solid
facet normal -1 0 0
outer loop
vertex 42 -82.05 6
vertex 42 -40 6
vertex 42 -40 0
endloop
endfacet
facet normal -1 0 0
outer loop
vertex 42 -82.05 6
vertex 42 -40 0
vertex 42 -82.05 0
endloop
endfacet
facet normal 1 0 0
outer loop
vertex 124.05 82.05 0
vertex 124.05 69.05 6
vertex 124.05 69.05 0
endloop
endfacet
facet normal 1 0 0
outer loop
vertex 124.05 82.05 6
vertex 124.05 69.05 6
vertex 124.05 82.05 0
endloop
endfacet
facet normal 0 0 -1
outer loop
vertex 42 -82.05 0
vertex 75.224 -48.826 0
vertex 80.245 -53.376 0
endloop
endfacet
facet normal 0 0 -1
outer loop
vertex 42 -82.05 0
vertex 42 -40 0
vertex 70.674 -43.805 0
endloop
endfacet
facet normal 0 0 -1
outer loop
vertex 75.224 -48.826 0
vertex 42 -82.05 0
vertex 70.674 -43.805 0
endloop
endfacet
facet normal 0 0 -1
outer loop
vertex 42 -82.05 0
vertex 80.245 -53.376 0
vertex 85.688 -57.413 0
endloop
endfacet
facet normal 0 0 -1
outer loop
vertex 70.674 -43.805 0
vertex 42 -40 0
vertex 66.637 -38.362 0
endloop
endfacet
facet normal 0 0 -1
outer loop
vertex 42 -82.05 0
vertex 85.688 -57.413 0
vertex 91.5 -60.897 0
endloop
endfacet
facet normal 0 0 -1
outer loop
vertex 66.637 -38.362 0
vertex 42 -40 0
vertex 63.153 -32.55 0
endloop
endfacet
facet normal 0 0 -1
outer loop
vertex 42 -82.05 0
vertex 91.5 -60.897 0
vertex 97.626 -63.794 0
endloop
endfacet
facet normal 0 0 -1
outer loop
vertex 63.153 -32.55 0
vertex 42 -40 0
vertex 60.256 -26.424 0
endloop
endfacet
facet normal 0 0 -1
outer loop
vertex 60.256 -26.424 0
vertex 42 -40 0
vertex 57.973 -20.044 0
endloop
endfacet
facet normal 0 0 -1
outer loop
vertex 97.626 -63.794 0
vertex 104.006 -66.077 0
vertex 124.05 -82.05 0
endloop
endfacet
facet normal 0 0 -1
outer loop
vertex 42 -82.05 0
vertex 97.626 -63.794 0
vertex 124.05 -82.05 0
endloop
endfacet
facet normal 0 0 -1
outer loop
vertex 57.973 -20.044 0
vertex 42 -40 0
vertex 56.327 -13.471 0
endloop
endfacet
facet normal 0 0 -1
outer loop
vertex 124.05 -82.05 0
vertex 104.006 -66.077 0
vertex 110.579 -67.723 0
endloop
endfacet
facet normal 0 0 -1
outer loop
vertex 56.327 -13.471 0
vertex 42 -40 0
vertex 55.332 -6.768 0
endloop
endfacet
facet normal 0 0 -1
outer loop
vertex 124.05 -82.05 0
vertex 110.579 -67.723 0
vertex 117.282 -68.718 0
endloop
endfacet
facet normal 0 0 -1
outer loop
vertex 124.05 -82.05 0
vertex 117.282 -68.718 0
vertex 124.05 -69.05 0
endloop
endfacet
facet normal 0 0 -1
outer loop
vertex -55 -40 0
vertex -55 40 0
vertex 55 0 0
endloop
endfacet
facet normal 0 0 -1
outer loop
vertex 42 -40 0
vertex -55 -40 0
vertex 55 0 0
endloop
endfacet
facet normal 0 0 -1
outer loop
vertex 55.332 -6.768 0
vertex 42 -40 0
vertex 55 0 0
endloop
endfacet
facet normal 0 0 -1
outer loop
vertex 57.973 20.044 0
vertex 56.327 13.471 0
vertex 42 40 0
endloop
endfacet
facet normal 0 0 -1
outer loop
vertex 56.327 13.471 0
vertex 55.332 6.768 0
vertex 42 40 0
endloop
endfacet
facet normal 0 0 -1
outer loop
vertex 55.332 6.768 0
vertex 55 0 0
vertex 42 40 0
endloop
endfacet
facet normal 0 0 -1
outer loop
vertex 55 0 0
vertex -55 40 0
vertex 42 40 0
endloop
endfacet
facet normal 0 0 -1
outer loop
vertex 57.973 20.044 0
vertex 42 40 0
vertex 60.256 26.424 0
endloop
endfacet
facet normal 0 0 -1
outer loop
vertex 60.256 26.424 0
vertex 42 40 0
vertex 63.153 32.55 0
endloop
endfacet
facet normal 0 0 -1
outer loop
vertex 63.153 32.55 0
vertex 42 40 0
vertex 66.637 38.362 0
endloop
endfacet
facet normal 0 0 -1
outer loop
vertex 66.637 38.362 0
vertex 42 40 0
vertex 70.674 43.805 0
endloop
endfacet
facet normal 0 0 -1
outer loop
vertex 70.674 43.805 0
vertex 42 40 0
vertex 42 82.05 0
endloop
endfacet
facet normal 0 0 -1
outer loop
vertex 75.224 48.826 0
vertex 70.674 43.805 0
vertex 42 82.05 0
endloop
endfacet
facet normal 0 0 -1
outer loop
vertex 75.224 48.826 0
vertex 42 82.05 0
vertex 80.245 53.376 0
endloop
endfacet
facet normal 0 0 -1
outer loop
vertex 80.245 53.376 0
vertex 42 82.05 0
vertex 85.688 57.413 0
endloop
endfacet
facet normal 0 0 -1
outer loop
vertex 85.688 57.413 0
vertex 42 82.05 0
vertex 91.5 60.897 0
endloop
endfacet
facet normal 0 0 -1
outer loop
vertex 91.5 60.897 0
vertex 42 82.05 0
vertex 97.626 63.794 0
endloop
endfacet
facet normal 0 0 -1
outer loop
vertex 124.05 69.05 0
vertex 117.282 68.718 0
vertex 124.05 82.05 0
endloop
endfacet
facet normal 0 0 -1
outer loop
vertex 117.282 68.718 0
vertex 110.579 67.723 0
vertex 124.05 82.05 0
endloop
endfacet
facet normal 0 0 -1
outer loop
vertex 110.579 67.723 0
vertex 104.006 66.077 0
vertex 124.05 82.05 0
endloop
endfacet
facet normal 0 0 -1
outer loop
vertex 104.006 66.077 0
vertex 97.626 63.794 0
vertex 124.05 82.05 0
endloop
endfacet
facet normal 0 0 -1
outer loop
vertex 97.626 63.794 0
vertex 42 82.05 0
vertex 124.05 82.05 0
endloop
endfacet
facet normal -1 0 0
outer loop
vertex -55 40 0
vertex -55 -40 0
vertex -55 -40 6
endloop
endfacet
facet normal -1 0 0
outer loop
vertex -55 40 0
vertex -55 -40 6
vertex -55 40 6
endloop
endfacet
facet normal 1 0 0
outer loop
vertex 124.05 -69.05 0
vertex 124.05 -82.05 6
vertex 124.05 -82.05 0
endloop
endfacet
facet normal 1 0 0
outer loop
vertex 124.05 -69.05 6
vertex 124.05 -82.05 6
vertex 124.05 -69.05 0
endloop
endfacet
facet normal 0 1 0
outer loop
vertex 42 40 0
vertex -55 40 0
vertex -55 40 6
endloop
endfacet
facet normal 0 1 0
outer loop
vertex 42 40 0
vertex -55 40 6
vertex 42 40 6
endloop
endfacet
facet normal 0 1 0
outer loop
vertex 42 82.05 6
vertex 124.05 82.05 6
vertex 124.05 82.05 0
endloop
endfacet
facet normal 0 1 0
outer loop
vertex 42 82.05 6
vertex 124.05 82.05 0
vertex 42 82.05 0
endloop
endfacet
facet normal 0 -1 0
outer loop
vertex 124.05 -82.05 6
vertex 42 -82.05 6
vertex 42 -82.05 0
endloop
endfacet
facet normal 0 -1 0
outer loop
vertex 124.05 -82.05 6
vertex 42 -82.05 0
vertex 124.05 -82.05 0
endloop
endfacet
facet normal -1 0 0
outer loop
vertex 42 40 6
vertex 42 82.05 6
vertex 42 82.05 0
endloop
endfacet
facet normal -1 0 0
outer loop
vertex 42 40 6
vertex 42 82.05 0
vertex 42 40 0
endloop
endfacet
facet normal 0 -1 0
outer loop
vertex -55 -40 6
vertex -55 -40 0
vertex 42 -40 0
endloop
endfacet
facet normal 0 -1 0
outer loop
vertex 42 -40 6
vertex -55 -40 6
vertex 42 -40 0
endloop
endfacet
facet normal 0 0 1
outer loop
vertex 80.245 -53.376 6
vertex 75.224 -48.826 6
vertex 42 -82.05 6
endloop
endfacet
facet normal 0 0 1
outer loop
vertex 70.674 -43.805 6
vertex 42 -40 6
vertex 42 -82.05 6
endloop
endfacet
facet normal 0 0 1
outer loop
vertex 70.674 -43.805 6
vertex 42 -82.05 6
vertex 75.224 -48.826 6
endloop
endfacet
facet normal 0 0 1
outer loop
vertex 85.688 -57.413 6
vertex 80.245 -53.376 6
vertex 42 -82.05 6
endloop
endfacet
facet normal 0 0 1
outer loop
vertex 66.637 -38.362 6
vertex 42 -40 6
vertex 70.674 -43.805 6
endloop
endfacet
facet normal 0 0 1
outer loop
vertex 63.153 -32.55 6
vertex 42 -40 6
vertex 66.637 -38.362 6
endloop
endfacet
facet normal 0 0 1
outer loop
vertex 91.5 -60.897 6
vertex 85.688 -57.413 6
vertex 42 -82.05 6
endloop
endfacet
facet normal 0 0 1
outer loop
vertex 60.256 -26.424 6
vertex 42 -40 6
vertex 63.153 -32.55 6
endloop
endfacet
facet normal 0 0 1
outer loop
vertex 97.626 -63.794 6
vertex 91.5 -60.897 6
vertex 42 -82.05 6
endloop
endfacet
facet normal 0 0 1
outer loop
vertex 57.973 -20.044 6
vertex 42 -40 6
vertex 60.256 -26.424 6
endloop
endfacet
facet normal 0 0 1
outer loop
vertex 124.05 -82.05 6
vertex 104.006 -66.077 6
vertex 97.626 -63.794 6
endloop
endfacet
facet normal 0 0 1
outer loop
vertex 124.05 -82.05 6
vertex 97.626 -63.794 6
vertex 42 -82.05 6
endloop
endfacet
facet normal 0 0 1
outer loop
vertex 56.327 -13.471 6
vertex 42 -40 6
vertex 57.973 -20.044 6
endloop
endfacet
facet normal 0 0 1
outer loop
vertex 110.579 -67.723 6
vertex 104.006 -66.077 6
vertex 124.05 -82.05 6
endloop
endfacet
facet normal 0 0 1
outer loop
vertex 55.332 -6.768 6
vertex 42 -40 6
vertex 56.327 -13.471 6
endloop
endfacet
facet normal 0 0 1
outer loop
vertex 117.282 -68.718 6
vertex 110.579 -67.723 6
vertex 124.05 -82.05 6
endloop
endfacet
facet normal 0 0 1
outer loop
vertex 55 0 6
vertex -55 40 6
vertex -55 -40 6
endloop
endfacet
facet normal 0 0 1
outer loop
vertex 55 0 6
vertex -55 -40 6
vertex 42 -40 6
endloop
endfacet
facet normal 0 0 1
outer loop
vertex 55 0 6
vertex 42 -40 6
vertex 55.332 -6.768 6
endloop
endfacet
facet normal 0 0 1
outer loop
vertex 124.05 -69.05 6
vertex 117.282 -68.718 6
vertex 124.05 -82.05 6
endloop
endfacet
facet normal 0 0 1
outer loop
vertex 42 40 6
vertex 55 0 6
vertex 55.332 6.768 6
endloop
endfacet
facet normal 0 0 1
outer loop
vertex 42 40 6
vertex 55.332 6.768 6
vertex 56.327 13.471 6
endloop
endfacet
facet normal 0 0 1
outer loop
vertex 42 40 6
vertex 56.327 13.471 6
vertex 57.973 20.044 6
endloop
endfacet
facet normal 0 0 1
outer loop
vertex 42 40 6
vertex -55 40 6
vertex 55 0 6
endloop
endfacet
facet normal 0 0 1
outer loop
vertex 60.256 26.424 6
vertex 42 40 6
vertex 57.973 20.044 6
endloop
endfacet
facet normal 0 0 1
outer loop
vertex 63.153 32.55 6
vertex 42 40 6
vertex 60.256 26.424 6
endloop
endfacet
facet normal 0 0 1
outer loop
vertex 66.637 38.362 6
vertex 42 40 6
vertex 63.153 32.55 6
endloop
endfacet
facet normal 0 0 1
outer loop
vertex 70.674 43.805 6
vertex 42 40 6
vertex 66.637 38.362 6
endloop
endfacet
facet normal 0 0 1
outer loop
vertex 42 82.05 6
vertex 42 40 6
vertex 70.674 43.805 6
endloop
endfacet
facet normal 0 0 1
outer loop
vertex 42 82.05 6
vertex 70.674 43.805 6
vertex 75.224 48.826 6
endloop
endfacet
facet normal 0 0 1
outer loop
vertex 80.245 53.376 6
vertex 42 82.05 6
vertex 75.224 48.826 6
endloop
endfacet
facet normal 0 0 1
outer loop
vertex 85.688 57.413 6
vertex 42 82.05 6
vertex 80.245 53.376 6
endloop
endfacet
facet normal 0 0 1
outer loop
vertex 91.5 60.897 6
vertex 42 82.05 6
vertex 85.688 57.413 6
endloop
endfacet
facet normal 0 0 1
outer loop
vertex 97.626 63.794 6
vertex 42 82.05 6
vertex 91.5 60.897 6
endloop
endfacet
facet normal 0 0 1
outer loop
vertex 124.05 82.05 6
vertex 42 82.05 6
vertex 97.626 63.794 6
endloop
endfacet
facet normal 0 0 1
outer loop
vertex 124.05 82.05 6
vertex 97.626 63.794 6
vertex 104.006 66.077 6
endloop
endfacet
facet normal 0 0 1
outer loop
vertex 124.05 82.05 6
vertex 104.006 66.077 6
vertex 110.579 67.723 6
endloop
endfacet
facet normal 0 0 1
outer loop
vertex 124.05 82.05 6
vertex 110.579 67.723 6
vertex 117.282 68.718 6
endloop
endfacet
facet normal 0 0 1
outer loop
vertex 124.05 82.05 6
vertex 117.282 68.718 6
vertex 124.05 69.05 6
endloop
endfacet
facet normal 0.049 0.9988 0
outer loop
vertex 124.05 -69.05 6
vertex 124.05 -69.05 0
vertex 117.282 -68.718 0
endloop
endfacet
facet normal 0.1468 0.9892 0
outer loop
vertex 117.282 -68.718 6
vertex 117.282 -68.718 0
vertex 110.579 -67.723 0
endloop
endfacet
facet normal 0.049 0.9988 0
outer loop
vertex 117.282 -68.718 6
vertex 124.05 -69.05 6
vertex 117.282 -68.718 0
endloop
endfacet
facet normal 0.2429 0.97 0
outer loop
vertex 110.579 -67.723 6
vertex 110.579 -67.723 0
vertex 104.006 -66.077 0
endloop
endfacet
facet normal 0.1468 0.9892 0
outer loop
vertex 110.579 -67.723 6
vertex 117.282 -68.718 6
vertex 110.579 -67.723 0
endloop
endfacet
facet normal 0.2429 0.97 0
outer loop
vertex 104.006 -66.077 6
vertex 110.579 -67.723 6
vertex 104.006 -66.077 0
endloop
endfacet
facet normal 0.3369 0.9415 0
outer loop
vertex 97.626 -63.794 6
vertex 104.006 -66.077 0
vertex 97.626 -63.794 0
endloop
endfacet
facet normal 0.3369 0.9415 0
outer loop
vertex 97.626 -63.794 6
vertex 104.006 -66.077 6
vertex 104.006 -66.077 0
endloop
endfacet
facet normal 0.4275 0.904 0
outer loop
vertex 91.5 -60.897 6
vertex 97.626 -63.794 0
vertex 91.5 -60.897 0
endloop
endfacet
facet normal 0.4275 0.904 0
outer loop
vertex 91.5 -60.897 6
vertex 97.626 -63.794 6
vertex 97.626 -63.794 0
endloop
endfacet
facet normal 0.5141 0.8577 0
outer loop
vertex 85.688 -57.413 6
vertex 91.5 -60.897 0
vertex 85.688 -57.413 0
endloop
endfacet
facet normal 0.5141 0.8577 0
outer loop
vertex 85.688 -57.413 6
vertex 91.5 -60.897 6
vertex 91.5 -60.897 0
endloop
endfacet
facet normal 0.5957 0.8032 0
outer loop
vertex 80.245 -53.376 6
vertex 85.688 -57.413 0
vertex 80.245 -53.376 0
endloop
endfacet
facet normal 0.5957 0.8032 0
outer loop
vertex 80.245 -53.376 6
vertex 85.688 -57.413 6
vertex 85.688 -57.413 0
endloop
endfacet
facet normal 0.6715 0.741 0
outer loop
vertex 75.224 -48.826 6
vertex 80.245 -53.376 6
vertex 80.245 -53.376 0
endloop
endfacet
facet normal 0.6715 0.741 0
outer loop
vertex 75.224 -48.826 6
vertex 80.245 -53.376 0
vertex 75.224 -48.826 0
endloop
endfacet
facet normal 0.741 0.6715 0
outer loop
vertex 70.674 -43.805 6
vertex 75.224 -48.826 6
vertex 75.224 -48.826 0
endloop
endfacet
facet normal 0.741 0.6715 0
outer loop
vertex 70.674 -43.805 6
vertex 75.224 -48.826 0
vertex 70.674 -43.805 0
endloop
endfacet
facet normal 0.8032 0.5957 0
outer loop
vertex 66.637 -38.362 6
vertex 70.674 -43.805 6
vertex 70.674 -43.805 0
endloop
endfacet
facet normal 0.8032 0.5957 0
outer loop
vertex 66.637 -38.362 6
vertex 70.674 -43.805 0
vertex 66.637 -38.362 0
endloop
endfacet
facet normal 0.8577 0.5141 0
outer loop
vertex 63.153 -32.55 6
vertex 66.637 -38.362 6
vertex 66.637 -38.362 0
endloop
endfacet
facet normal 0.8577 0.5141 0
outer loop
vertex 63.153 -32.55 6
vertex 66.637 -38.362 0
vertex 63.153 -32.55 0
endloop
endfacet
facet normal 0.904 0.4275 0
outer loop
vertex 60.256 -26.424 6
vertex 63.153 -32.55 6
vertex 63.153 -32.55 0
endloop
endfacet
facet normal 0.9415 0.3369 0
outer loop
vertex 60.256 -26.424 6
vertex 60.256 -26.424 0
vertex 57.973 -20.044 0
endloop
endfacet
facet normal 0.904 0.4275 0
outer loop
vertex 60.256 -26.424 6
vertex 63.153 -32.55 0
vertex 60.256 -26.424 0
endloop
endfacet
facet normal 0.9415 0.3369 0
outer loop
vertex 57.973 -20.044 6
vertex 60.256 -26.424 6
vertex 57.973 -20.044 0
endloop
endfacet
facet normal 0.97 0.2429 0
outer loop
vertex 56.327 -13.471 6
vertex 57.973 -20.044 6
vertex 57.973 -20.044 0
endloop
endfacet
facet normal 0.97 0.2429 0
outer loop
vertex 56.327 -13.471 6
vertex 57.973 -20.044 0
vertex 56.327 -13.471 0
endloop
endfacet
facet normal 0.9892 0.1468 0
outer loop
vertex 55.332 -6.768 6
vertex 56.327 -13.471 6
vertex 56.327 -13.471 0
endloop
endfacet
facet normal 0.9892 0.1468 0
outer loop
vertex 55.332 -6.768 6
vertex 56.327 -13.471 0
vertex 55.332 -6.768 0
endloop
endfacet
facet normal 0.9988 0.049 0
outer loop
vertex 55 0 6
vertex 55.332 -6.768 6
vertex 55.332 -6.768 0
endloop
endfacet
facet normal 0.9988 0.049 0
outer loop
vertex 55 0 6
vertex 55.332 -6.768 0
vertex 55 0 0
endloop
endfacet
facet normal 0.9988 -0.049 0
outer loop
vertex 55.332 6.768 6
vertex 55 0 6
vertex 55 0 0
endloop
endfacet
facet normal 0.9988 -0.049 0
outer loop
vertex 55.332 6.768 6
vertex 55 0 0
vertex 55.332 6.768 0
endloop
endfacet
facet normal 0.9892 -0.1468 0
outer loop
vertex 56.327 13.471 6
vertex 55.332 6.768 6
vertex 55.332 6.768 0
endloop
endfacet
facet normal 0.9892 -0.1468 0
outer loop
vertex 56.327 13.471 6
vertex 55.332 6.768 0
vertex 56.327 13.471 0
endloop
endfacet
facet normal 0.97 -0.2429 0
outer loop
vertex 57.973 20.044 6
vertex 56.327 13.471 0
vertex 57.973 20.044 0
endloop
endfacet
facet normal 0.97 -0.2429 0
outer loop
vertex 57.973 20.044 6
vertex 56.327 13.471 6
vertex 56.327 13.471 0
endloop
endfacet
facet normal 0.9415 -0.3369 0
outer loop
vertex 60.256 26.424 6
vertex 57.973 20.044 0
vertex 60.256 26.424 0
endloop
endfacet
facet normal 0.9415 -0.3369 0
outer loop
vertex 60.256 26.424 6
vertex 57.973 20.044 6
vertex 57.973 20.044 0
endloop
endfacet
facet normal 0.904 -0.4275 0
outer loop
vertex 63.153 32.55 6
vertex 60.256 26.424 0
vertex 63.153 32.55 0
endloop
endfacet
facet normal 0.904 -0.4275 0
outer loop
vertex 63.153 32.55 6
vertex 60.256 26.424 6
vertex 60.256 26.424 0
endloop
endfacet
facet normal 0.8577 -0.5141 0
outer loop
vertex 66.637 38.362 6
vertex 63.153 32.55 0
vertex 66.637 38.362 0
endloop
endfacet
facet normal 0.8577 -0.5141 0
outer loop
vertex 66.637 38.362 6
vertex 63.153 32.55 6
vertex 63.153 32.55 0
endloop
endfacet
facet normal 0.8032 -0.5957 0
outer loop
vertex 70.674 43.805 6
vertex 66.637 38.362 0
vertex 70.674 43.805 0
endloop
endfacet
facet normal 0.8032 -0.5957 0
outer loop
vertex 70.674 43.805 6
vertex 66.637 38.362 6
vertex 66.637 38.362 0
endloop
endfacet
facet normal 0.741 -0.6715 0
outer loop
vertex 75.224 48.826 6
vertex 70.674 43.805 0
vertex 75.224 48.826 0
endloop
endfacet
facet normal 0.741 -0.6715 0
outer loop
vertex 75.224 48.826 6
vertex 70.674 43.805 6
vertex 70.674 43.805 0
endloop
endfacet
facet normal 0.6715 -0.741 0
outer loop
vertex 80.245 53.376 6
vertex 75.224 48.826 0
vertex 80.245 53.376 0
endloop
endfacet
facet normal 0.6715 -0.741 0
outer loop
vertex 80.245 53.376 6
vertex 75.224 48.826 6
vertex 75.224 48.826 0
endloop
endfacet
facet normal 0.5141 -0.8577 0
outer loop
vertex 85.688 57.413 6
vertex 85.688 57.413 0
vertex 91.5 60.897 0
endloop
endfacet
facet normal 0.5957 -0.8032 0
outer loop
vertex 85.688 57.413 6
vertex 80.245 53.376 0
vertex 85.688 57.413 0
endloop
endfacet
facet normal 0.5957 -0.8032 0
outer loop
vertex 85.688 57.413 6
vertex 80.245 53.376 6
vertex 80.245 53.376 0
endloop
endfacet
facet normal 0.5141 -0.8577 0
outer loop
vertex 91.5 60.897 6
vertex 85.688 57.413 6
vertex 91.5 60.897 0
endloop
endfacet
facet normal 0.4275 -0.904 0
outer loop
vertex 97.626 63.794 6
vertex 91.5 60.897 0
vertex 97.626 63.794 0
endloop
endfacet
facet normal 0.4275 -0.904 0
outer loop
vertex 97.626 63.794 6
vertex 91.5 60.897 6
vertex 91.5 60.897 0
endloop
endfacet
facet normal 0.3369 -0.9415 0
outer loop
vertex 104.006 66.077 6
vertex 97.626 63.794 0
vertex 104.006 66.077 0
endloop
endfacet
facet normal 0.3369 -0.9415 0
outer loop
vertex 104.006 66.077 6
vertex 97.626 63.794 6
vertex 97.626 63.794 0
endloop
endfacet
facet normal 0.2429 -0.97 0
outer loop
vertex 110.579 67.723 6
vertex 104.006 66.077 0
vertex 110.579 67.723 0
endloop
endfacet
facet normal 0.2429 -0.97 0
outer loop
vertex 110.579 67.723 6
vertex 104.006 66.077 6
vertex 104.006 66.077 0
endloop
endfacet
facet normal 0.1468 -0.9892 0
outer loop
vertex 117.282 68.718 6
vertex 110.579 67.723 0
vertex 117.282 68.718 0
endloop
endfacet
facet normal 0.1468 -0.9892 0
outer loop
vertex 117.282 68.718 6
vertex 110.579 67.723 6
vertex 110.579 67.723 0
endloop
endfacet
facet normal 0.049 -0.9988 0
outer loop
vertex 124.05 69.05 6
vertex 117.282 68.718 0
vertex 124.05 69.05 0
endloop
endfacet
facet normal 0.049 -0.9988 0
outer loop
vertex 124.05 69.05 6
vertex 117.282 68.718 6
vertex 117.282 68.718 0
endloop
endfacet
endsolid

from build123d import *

# Parameters (mm, degrees)
SKETCH_1_W      = 110
SKETCH_1_H      = 80
EXTRUDE_1_DEPTH = 6
EXTRUDE_2_DEPTH = 6


with BuildPart() as part:
    # Эскиз1 → Бобышка-Вытянуть1 (new body)
    with BuildSketch(Plane.XY):
        Rectangle(SKETCH_1_W, SKETCH_1_H)
    extrude(amount=EXTRUDE_1_DEPTH)

    # Эскиз2 → Бобышка-Вытянуть2 (add)
    with BuildSketch(Plane.XY.offset(6)):
        with BuildLine():
            Line((124.05, 82.05), (42, 82.05))
            Line((42, 82.05), (42, -82.05))
            Line((42, -82.05), (124.05, -82.05))
            Line((124.05, -82.05), (124.05, -69.05))
            ThreePointArc((124.05, -69.05), (55, 0), (124.05, 69.05))
            Line((124.05, 69.05), (124.05, 82.05))
        make_face()
    extrude(amount=-EXTRUDE_2_DEPTH)


solid = part.part
